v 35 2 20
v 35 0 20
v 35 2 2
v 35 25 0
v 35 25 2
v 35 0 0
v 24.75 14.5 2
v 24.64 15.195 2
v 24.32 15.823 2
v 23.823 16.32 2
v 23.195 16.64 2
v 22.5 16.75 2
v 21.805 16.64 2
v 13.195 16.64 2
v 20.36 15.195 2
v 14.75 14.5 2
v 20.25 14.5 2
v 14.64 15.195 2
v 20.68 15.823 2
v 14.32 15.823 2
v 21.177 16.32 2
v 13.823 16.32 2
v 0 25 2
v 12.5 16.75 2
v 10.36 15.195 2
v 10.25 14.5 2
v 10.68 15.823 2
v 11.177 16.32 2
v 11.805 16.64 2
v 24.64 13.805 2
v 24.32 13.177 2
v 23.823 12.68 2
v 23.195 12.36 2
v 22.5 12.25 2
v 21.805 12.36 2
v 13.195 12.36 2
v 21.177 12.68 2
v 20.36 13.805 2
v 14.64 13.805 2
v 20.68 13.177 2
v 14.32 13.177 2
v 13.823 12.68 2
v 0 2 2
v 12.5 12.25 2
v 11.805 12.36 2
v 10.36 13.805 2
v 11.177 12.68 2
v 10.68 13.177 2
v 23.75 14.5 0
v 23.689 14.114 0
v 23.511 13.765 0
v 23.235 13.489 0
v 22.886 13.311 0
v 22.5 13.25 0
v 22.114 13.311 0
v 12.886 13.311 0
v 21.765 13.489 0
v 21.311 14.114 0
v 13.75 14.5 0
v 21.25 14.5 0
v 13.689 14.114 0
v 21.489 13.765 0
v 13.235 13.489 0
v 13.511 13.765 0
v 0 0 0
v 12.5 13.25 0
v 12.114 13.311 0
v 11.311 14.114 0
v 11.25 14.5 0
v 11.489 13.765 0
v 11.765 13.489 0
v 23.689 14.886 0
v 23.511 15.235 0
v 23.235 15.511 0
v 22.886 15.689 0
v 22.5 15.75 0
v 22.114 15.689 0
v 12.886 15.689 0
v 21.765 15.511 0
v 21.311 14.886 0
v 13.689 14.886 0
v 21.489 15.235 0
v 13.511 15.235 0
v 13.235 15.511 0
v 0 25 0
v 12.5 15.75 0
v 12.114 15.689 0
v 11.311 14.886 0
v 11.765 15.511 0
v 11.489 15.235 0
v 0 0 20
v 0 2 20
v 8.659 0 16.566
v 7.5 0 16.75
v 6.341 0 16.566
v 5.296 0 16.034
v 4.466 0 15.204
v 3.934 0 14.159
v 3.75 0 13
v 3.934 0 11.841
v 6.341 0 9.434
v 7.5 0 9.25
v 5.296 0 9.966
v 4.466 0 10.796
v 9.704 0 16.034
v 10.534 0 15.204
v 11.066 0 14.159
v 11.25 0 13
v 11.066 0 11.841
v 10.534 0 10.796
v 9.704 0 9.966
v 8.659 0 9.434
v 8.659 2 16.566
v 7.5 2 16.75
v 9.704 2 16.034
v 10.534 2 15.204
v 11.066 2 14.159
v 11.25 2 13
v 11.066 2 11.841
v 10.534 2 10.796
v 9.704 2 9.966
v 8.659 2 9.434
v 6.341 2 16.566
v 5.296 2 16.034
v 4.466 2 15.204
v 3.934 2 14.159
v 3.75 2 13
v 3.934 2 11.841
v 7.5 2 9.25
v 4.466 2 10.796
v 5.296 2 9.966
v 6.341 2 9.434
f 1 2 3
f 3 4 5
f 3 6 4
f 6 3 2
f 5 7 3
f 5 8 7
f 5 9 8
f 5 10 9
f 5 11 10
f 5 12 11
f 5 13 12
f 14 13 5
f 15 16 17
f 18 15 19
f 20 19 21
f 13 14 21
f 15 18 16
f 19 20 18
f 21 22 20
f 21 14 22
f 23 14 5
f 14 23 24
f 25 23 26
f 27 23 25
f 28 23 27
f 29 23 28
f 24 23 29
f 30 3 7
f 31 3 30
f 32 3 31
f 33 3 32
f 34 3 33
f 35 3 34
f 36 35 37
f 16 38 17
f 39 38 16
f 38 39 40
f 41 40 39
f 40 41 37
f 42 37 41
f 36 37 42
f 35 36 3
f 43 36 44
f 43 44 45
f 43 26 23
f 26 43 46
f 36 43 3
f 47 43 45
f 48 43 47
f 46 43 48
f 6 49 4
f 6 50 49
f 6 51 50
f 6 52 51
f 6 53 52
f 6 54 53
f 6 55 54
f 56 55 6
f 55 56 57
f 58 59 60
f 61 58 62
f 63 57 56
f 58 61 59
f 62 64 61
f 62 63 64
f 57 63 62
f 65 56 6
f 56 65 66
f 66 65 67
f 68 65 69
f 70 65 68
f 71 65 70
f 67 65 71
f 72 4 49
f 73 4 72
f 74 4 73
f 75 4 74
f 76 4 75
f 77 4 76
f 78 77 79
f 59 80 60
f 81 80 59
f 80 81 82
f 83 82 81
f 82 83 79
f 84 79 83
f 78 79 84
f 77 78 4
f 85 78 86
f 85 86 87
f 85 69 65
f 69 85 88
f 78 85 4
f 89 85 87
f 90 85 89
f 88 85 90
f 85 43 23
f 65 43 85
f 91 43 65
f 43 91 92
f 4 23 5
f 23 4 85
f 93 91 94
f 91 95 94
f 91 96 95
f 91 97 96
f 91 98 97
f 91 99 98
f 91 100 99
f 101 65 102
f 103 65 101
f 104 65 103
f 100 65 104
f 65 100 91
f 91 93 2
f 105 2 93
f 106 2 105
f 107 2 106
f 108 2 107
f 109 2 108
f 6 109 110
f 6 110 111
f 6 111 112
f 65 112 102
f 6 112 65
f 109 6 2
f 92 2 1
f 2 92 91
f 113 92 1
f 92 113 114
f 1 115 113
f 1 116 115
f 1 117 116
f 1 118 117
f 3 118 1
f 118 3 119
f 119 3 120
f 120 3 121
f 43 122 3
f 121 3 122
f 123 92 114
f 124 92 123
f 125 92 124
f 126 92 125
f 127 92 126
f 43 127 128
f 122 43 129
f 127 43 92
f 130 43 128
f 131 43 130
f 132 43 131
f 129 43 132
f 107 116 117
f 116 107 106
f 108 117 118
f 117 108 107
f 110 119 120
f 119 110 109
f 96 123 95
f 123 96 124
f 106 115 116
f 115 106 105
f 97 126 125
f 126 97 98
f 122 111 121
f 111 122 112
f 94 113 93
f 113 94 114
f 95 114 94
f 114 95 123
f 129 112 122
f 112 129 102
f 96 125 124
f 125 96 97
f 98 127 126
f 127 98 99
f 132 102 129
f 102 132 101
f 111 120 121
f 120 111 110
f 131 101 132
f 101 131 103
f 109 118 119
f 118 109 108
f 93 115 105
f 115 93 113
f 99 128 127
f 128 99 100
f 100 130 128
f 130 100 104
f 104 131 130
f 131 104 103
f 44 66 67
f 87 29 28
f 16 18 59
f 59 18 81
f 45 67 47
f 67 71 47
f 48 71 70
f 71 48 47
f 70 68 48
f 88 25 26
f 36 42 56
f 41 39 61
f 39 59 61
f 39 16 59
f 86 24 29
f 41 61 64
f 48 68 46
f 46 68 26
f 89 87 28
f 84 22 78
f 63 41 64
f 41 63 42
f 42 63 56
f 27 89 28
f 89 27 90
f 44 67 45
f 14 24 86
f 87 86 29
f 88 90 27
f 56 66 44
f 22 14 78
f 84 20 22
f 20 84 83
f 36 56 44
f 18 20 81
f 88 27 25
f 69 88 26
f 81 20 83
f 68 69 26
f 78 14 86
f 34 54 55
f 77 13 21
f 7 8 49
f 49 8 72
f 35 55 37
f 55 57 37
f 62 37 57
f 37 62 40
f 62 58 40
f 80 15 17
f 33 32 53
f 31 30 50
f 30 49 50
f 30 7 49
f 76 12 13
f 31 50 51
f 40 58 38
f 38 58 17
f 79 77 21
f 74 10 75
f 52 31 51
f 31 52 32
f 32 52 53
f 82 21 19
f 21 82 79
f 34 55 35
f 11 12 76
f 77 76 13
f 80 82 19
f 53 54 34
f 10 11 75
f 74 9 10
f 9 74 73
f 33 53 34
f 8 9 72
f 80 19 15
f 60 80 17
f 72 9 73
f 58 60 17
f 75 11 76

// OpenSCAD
$fn=20;

difference() {
    union() {
        cube([35,25,2]);
        cube([35,2,20]);
    }
    /* potentiometer hole: */
    translate([7.5,0,13]) rotate([90,0,0]) cylinder(d=7.5, h=4.5, center=true);
    /* screw holes & countersinks: */
    translate([12.5,14.5,0]) cylinder(d1=2.5, d2=4.5, h=2);
    translate([22.5,14.5,0]) cylinder(d1=2.5, d2=4.5, h=2);
}
